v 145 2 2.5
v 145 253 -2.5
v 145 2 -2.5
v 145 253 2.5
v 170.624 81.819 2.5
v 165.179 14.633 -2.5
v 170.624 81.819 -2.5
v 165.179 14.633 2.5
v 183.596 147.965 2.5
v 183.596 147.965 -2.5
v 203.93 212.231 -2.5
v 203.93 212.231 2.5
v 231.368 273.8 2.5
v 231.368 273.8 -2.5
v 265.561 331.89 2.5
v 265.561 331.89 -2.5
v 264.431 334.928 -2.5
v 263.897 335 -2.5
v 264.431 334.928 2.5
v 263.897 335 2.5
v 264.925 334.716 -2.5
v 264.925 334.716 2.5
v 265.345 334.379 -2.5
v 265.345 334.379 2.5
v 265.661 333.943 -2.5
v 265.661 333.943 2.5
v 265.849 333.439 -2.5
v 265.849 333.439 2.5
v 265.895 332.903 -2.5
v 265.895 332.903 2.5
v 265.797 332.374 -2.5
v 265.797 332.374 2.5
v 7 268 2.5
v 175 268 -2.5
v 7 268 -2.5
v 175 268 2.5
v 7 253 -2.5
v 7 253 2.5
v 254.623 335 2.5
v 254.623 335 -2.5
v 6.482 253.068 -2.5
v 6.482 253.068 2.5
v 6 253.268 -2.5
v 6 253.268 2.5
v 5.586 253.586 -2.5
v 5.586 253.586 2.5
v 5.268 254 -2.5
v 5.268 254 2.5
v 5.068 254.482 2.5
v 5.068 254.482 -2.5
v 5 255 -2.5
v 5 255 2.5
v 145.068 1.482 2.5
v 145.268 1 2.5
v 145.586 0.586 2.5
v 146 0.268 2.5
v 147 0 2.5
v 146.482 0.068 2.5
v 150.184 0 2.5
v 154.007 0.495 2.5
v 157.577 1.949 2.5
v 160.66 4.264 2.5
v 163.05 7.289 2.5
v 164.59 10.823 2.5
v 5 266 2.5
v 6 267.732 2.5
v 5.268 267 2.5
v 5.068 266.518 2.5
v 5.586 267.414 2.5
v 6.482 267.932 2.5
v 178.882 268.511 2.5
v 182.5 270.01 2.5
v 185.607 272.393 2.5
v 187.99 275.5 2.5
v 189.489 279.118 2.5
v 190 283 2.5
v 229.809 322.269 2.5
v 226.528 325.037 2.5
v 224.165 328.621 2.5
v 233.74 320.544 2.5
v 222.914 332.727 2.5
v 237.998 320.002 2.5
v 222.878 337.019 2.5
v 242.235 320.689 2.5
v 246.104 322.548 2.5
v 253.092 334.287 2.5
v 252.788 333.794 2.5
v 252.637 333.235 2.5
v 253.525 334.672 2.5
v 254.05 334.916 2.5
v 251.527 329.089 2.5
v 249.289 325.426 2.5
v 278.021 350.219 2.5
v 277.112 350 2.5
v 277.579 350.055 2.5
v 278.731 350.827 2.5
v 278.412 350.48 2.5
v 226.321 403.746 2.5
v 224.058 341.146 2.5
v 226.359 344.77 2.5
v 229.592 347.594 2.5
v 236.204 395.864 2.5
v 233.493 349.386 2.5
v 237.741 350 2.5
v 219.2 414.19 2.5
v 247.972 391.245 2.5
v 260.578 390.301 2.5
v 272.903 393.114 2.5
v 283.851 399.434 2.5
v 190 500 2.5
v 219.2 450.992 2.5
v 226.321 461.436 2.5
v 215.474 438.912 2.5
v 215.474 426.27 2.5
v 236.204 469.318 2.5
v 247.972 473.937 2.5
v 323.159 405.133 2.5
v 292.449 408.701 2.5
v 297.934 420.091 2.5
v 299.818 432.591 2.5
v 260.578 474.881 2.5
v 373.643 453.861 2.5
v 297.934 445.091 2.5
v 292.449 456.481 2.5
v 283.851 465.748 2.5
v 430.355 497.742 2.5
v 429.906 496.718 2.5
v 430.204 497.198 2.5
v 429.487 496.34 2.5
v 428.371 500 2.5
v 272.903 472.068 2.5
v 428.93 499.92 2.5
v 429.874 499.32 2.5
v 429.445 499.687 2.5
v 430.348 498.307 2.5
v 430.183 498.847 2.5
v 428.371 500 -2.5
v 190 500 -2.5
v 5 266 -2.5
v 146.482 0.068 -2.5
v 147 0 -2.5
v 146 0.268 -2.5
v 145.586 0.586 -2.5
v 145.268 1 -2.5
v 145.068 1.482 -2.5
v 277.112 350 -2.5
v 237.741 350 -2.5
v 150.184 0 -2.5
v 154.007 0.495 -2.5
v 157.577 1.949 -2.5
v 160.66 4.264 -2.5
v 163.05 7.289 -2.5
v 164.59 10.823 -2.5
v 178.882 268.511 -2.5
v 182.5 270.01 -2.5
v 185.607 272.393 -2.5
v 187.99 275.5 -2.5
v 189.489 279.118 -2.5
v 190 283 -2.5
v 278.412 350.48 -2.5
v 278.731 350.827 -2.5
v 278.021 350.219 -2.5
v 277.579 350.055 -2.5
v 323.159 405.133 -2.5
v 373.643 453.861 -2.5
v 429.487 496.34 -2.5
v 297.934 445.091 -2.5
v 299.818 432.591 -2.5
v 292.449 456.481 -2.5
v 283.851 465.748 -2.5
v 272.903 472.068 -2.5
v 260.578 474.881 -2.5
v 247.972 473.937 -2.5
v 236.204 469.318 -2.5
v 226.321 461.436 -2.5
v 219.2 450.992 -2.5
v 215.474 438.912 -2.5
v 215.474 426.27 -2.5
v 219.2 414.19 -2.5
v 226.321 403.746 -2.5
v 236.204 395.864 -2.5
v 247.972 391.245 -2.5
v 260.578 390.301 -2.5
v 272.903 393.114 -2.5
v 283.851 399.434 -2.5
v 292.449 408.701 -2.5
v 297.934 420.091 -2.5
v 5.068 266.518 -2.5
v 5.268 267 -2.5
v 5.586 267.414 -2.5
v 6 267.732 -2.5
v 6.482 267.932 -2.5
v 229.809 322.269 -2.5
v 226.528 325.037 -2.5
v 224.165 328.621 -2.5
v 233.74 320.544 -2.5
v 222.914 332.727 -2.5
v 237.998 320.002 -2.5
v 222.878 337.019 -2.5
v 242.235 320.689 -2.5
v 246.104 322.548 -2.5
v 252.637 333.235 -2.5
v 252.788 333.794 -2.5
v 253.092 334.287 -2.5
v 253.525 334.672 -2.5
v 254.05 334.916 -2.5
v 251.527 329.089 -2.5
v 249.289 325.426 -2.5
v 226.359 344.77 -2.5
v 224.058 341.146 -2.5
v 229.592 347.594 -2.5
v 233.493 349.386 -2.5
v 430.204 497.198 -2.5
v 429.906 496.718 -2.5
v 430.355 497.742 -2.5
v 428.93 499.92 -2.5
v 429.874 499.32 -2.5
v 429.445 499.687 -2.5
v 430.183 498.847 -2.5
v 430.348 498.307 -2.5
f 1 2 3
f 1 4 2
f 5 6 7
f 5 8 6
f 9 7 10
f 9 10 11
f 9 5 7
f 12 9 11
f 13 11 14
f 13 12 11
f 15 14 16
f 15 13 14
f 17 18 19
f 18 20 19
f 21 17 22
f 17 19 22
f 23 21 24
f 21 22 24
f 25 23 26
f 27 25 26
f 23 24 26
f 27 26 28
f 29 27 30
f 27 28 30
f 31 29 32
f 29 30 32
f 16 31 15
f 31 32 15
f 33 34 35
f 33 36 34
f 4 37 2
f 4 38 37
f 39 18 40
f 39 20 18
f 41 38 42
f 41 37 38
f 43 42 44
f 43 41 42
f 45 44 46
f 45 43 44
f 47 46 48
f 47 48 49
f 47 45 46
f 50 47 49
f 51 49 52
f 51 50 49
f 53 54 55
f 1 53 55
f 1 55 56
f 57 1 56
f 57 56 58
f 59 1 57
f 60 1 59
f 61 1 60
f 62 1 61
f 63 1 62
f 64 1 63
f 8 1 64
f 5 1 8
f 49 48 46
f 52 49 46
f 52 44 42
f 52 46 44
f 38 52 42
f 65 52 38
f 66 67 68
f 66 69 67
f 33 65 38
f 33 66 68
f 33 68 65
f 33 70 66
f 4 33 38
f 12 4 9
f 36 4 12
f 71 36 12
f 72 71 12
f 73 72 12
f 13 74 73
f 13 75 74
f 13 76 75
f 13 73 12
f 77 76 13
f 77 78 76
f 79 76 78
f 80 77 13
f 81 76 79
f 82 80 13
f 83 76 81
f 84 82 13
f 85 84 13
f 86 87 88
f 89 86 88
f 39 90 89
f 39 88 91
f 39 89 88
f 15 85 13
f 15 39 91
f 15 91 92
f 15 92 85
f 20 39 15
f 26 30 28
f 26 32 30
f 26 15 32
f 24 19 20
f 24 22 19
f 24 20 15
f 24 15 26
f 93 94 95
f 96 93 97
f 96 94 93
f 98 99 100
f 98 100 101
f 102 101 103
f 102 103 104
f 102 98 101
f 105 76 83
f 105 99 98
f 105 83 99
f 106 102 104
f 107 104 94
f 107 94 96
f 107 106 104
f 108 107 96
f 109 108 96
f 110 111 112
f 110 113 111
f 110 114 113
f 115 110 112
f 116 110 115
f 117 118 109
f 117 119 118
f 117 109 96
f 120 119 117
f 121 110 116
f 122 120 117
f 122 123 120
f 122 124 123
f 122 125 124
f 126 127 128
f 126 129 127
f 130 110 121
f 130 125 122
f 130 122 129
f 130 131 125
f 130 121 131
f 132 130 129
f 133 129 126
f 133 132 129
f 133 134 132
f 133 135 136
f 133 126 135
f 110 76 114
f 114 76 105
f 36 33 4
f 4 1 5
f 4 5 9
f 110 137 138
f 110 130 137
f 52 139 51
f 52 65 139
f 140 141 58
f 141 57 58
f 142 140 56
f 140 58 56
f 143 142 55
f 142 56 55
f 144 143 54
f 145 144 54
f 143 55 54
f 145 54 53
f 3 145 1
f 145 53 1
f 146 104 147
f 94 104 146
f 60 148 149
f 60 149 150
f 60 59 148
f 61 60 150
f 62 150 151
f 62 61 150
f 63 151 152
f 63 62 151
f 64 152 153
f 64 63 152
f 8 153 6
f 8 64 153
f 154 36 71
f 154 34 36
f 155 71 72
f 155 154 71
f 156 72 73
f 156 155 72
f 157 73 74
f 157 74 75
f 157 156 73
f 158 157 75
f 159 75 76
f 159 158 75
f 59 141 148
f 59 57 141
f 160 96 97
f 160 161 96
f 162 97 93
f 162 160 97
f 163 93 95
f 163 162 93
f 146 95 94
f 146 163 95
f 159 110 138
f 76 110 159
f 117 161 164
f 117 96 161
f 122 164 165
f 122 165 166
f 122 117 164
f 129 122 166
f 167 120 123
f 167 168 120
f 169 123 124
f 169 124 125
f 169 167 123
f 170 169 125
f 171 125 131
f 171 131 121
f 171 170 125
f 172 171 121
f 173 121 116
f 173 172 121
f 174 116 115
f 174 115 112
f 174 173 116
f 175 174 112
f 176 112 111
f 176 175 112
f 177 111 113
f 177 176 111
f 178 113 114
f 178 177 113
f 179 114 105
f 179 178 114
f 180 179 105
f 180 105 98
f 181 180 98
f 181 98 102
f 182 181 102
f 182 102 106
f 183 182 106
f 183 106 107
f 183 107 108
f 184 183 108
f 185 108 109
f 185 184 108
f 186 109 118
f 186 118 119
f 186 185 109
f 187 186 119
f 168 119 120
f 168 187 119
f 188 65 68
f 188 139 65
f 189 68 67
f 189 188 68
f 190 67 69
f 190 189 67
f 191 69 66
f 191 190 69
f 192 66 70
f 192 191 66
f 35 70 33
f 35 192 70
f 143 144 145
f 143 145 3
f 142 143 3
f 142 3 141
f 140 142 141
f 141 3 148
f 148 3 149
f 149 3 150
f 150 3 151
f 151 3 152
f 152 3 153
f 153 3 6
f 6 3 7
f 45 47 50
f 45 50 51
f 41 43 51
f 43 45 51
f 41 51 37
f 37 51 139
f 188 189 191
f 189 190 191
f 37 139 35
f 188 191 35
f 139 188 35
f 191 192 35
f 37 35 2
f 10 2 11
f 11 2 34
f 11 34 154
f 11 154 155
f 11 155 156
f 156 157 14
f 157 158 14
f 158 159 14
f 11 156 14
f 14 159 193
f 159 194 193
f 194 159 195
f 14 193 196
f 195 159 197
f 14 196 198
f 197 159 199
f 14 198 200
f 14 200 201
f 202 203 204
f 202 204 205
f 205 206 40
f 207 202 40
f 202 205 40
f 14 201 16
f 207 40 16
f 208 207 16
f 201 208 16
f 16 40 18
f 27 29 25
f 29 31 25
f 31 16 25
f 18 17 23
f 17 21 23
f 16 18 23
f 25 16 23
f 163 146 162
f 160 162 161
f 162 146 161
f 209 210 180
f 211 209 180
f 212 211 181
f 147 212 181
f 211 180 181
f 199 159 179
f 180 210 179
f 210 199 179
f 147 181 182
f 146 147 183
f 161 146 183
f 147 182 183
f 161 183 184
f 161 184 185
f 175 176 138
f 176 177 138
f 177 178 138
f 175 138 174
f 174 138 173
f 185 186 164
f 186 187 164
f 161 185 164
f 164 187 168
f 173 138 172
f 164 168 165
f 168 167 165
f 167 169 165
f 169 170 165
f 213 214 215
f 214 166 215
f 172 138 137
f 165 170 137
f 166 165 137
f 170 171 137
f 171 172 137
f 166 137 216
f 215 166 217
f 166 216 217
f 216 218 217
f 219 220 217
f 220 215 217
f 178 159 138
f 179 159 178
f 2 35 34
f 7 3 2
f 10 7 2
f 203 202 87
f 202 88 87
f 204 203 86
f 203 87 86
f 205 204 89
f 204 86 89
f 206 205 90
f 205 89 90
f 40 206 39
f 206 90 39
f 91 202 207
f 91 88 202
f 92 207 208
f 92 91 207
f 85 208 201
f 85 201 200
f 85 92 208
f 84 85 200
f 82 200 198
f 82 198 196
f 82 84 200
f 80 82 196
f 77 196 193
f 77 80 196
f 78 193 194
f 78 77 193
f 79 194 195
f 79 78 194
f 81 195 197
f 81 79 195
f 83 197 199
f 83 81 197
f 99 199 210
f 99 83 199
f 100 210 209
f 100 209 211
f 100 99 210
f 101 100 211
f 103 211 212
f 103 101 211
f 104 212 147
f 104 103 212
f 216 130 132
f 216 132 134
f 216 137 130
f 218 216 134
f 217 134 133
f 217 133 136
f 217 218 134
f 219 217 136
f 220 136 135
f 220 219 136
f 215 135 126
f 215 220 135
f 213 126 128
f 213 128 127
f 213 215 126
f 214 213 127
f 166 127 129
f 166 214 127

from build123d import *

# Parameters (mm, degrees)
F0_R     = 42.408979
F1_DEPTH = 2.5
F2_R     = 2
F3_R     = 15


with BuildPart() as f1:
    # F0 (on Top) → F1 (new body, symmetric)
    with BuildSketch(Plane.XY):
        with BuildLine():
            Line((5, 253), (145, 253))
            Line((145, 253), (145, 0))
            Line((145, 0), (165, 0))
            ThreePointArc((165, 0), (191.238215, 175.187092), (267.650228, 335))
            Line((267.650228, 335), (252.741245, 335))
            ThreePointArc((252.741245, 335), (227.134643, 324.393398), (237.741245, 350))
            Line((237.741245, 350), (278.1334, 350))
            ThreePointArc((278.1334, 350), (349.704058, 432.176795), (435, 500))
            Line((435, 500), (190, 500))
            Line((190, 500), (190, 268))
            Line((190, 268), (5, 268))
            Line((5, 268), (5, 253))
        make_face()
        with Locations((257.408979, 432.591021)):
            Circle(F0_R, mode=Mode.SUBTRACT)
    extrude(amount=F1_DEPTH, both=True)

    # F2
    f2_edges = [f1.edges().sort_by_distance(p)[0] for p in [
        (435, 500, 0),
        (145, 0, 0),
        (5, 268, 0),
        (5, 253, 0),
        (278.1334, 350, 0),
        (267.650228, 335, 0),
        (252.741245, 335, 0),
    ]]
    fillet(f2_edges, radius=F2_R)

    # F3
    f3_edges = [f1.edges().sort_by_distance(p)[0] for p in [
        (190, 268, 0),
        (165, 0, 0),
    ]]
    fillet(f3_edges, radius=F3_R)


solid = f1.part
